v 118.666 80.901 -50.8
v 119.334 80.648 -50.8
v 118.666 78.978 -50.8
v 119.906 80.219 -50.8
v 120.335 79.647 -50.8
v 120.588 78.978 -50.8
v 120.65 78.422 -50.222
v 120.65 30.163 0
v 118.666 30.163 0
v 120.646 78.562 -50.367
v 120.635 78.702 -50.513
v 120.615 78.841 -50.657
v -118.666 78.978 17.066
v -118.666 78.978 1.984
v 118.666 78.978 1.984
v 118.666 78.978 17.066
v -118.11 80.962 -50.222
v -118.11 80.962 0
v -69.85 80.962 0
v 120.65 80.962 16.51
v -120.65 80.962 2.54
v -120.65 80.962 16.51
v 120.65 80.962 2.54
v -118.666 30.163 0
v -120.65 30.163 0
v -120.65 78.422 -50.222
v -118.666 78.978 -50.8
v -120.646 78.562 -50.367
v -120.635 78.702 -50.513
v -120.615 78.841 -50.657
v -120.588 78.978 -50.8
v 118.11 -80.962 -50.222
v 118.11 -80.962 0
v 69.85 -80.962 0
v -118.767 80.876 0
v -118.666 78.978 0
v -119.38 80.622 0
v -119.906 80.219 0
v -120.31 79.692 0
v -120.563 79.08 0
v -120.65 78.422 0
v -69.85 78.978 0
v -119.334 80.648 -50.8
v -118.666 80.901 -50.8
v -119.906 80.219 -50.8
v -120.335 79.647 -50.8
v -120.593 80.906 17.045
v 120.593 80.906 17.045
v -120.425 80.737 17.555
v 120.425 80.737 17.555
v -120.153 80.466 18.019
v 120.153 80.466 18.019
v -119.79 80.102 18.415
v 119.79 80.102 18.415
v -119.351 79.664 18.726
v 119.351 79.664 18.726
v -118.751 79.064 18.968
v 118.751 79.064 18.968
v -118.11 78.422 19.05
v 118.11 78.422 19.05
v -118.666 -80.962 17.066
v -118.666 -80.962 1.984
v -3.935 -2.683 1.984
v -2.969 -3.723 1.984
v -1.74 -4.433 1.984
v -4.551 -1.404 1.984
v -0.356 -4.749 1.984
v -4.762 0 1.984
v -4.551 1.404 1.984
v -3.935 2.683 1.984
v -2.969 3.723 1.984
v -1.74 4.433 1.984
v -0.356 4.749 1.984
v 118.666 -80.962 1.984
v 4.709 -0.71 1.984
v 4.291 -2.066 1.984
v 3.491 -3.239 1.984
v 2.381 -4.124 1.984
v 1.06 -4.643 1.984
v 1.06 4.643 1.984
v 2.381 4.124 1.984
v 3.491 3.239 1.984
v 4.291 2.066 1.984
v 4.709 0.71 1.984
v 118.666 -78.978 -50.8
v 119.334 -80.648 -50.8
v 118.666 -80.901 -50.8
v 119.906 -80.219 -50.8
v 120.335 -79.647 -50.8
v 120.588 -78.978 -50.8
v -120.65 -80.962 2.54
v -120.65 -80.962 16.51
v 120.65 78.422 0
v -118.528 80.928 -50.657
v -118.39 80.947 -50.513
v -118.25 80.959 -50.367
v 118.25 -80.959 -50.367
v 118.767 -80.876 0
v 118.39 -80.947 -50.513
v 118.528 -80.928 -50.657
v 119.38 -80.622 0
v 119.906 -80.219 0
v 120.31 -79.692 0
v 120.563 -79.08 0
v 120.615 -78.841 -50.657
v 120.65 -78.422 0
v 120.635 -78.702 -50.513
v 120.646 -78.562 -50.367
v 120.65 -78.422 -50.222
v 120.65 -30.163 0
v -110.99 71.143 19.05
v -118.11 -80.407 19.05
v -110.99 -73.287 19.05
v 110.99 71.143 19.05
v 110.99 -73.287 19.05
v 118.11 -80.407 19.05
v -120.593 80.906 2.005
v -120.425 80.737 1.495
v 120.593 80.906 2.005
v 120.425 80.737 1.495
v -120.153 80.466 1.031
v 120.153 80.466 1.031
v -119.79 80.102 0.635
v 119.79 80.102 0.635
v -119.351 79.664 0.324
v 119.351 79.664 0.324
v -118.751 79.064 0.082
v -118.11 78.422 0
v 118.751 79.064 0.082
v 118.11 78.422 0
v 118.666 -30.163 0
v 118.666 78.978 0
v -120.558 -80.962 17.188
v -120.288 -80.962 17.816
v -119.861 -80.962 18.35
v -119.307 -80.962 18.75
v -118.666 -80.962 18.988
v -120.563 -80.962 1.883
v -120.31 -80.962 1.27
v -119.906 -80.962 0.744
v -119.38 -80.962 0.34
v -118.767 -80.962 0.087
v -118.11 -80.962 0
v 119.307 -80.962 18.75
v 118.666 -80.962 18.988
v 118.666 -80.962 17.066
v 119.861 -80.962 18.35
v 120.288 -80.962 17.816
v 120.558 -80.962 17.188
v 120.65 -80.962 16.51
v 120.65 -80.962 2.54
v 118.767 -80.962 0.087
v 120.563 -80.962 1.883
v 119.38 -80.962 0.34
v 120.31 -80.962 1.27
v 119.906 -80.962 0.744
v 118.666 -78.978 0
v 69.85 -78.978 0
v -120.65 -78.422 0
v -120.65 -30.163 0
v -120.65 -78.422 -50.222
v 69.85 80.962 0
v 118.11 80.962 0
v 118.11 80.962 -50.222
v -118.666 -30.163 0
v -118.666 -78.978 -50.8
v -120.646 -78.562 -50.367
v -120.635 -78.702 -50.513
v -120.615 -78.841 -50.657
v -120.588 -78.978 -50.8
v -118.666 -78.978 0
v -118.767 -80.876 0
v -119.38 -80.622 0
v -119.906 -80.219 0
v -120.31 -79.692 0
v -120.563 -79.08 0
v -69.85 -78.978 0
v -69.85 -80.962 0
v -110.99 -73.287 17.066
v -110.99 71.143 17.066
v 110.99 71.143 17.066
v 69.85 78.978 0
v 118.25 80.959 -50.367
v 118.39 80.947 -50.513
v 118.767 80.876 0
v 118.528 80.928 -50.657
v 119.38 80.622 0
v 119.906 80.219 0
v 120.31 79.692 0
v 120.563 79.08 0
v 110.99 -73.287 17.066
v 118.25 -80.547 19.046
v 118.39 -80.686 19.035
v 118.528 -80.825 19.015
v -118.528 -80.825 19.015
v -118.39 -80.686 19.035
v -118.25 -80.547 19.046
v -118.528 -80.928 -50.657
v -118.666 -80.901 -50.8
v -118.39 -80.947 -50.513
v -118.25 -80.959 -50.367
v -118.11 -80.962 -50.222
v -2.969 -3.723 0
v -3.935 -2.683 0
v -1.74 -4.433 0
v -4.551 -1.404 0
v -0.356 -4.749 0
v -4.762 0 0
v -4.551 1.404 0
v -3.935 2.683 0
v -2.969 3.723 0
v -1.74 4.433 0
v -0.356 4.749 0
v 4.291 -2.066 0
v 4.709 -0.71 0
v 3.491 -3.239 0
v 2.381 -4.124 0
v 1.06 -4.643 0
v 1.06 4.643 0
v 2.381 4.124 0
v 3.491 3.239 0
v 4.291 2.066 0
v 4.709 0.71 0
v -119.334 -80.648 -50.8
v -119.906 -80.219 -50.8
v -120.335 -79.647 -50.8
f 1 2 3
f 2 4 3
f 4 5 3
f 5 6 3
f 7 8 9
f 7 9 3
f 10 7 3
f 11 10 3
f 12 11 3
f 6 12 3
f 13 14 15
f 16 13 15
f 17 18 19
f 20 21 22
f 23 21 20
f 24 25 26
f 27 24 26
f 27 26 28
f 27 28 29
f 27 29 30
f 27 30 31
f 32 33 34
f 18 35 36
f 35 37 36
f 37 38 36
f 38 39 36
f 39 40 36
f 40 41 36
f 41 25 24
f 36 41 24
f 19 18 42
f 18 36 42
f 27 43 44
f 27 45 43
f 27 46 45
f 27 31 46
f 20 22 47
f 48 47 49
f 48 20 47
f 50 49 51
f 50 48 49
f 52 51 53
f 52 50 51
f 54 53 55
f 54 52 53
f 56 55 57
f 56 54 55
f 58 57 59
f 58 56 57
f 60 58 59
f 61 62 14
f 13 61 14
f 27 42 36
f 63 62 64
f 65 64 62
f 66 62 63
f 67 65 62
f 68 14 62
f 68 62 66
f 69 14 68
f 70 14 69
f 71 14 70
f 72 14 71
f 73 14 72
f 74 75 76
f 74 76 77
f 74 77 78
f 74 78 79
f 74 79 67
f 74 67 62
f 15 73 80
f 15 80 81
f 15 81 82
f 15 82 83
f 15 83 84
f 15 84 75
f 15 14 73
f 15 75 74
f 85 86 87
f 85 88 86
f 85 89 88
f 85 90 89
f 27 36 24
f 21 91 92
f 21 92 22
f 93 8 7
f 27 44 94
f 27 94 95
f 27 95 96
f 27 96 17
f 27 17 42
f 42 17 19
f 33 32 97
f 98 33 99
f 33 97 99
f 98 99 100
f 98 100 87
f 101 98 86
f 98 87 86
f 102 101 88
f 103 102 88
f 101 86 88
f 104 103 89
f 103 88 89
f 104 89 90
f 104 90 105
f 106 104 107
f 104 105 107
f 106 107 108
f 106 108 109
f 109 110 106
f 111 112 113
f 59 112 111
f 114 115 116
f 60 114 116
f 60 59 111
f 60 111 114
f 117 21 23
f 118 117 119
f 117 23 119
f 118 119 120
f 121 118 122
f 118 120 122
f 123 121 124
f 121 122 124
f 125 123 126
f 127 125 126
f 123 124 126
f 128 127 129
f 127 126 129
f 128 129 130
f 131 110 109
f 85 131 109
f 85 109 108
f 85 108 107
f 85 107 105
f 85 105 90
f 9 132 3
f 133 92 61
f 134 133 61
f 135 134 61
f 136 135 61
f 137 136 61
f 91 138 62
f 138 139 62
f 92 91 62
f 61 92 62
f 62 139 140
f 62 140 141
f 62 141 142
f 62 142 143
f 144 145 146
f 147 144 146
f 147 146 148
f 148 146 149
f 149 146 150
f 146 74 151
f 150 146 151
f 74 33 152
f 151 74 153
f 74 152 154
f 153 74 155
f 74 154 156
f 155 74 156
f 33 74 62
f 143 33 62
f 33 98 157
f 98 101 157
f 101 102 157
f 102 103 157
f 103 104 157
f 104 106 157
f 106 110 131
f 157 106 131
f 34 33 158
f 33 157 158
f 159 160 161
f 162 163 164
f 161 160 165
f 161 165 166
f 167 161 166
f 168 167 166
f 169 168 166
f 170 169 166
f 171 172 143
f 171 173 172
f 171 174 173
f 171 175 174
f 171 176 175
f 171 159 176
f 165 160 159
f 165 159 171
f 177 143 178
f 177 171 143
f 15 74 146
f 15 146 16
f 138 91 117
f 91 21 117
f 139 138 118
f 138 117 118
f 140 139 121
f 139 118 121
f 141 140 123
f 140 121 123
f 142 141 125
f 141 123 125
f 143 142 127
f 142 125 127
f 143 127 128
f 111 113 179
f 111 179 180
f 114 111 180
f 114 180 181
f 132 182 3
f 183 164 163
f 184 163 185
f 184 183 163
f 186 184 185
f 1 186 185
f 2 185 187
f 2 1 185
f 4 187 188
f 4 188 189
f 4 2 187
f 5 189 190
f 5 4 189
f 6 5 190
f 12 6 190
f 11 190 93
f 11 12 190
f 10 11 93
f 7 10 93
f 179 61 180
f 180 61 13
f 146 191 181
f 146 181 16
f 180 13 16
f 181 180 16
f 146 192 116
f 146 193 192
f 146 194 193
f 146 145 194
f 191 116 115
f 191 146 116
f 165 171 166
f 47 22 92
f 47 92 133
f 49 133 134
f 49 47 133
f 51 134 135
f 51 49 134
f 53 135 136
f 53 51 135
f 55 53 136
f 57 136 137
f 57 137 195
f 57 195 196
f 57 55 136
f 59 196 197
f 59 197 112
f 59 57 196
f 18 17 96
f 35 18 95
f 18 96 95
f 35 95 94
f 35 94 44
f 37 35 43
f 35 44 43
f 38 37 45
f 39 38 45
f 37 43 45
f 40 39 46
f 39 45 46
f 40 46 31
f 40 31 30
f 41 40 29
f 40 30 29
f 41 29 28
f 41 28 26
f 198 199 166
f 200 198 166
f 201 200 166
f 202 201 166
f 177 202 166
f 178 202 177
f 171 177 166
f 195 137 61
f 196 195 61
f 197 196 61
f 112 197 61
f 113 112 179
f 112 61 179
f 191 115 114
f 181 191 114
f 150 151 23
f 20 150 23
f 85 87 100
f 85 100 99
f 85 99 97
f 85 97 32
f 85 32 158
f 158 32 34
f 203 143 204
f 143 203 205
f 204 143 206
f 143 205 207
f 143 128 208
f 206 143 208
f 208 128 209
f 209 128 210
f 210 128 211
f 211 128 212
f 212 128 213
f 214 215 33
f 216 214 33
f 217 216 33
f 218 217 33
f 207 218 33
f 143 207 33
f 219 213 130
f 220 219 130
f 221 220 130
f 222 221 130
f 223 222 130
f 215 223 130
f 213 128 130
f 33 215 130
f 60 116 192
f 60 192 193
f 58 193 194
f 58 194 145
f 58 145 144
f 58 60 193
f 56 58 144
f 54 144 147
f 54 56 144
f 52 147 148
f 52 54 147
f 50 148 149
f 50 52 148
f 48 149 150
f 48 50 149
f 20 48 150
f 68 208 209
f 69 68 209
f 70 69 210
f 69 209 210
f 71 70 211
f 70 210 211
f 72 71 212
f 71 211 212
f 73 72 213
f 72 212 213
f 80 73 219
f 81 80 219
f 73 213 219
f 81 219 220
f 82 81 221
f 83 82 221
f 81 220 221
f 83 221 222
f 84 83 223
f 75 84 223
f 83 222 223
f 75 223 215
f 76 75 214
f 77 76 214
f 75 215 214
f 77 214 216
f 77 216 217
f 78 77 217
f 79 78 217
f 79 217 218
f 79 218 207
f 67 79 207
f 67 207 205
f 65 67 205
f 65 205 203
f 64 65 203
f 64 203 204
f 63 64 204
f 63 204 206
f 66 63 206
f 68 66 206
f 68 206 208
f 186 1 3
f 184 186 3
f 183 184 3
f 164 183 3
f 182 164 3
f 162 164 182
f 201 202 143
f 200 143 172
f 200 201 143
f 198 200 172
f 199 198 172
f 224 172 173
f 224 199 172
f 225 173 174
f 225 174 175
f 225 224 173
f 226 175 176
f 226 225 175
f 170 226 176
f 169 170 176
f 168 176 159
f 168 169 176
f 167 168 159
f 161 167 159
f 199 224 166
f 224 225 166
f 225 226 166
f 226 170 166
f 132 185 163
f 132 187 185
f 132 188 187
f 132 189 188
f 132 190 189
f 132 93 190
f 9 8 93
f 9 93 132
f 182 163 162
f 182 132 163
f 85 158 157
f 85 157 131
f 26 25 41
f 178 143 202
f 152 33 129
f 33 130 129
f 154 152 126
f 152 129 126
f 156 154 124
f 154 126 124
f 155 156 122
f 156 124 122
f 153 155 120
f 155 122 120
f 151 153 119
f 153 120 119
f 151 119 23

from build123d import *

# Parameters (mm, degrees)
F0_W      = 241.3
F0_H      = 161.925
F1_DEPTH  = 19.05
F3_T      = -1.984375
F4_W      = 221.9808846712
F4_H      = 152.4099913843
F5_DEPTH  = 5.17584
F7_DEPTH  = 50.8
F9_DEPTH  = 1.984375
F11_DEPTH = 1.984375
F14_R     = 2.54
F15_R     = 2.54
F15_2_R   = 2.54
F15_3_R   = 2.54
F15_4_R   = 2.54
F17_DEPTH = 1.984375
F19_D     = 9.525


# Not quite as in the source:
# - a length typed as a fraction of an inch, garbled in the dataset ("3 / 203.2 mm" for 3/8 in), is restored
# - a pattern or mirror of a feature is missing from the dataset's text; its kind, count and spacing are read off the source's solid


with BuildPart() as f1:
    # F0 (on Top) → F1 (new body)
    with BuildSketch(Plane.XY):
        Rectangle(F0_W, F0_H)
    extrude(amount=F1_DEPTH)

    # F3
    f3_openings = [f1.faces().sort_by_distance(p)[0] for p in [
        (0, -80.9625, 9.525),
    ]]
    offset(amount=F3_T, openings=f3_openings)

    # F4 (on face) → F5 (cut)
    with BuildSketch(Plane.XY.offset(19.05)):
        with Locations((0, -5.0618006591)):
            Rectangle(F4_W, F4_H)
    extrude(amount=-F5_DEPTH, mode=Mode.SUBTRACT)

    # F14
    f14_edges = [f1.edges().sort_by_distance(p)[0] for p in [
        (-120.65, 0, 19.05),
        (0, 80.9625, 19.05),
        (120.65, 0, 19.05),
        (-120.65, 0, 0),
        (0, 80.9625, 0),
        (120.65, 0, 0),
    ]]
    fillet(f14_edges, radius=F14_R)

    # F16 (on face) → F17 (cut, through all)
    with BuildSketch(Plane(origin=(0, 0, 17.065625), x_dir=(1, 0, 0), z_dir=(0, 0, -1))):
        Polygon((-110.9904423356, 73.2873173356), (-110.9904423356, 80.9625), (-118.665625, 80.9625), align=None)
    f17 = extrude(amount=-F17_DEPTH, mode=Mode.SUBTRACT)

    # F17_copies: F17 across plane
    add(f17.mirror(Plane(origin=(0, 0, 0), x_dir=(0, 0, 1), z_dir=(1, 0, 0))), mode=Mode.SUBTRACT)

    # F19 (through all)
    with Locations(Plane.XY.offset(19.05)):
        with Locations((0, 0)):
            Hole(F19_D / 2)


with BuildPart() as f7:
    # F6 (on face) → F7 (new body)
    with BuildSketch(Plane(origin=(0, 0, 0), x_dir=(1, 0, 0), z_dir=(0, 0, -1))):
        Polygon((-120.65, -80.9625), (-69.85, -80.9625), (-69.85, -78.978125), (-118.665625, -78.978125), (-118.665625, -30.1625), (-120.65, -30.1625), align=None)
    extrude(amount=F7_DEPTH)

    # F8 (on face) → F9 (cut, through all)
    with BuildSketch(Plane(origin=(-120.65, 0, 0), x_dir=(0, -1, 0), z_dir=(-1, 0, 0))):
        Polygon((-30.1625, 0), (-78.978125, -50.8), (-30.1625, -50.8), align=None)
    extrude(amount=-F9_DEPTH, mode=Mode.SUBTRACT)

    # F10 (on face) → F11 (cut, through all)
    with BuildSketch(Plane(origin=(0, 80.9625, 0), x_dir=(-1, 0, 0), z_dir=(0, 1, 0))):
        Polygon((118.665625, -50.8), (69.85, 0), (69.85, -50.8), align=None)
    extrude(amount=-F11_DEPTH, mode=Mode.SUBTRACT)


with BuildPart() as f12_1:
    # F12: instance of F7
    add(f7.part.mirror(Plane.YZ))


with BuildPart() as f13_1:
    # F13: instance of F12_1
    add(f12_1.part.mirror(Plane.XZ))

    # F15#3
    f15_3_edges = [f13_1.edges().sort_by_distance(p)[0] for p in [
        (120.65, -80.9625, -25.4),
    ]]
    fillet(f15_3_edges, radius=F15_3_R)


with BuildPart() as f13_2:
    # F13: instance of F7
    add(f7.part.mirror(Plane.XZ))

    # F15#4
    f15_4_edges = [f13_2.edges().sort_by_distance(p)[0] for p in [
        (-120.65, -80.9625, -25.4),
    ]]
    fillet(f15_4_edges, radius=F15_4_R)


with BuildPart() as f7_1:
    add(f7.part)

    # F15
    f15_edges = [f7_1.edges().sort_by_distance(p)[0] for p in [
        (-120.65, 80.9625, -25.4),
    ]]
    fillet(f15_edges, radius=F15_R)


with BuildPart() as f12_1_1:
    add(f12_1.part)

    # F15#2
    f15_2_edges = [f12_1_1.edges().sort_by_distance(p)[0] for p in [
        (120.65, 80.9625, -25.4),
    ]]
    fillet(f15_2_edges, radius=F15_2_R)


solid = Compound([f1.part, f13_1.part, f13_2.part, f7_1.part, f12_1_1.part])
